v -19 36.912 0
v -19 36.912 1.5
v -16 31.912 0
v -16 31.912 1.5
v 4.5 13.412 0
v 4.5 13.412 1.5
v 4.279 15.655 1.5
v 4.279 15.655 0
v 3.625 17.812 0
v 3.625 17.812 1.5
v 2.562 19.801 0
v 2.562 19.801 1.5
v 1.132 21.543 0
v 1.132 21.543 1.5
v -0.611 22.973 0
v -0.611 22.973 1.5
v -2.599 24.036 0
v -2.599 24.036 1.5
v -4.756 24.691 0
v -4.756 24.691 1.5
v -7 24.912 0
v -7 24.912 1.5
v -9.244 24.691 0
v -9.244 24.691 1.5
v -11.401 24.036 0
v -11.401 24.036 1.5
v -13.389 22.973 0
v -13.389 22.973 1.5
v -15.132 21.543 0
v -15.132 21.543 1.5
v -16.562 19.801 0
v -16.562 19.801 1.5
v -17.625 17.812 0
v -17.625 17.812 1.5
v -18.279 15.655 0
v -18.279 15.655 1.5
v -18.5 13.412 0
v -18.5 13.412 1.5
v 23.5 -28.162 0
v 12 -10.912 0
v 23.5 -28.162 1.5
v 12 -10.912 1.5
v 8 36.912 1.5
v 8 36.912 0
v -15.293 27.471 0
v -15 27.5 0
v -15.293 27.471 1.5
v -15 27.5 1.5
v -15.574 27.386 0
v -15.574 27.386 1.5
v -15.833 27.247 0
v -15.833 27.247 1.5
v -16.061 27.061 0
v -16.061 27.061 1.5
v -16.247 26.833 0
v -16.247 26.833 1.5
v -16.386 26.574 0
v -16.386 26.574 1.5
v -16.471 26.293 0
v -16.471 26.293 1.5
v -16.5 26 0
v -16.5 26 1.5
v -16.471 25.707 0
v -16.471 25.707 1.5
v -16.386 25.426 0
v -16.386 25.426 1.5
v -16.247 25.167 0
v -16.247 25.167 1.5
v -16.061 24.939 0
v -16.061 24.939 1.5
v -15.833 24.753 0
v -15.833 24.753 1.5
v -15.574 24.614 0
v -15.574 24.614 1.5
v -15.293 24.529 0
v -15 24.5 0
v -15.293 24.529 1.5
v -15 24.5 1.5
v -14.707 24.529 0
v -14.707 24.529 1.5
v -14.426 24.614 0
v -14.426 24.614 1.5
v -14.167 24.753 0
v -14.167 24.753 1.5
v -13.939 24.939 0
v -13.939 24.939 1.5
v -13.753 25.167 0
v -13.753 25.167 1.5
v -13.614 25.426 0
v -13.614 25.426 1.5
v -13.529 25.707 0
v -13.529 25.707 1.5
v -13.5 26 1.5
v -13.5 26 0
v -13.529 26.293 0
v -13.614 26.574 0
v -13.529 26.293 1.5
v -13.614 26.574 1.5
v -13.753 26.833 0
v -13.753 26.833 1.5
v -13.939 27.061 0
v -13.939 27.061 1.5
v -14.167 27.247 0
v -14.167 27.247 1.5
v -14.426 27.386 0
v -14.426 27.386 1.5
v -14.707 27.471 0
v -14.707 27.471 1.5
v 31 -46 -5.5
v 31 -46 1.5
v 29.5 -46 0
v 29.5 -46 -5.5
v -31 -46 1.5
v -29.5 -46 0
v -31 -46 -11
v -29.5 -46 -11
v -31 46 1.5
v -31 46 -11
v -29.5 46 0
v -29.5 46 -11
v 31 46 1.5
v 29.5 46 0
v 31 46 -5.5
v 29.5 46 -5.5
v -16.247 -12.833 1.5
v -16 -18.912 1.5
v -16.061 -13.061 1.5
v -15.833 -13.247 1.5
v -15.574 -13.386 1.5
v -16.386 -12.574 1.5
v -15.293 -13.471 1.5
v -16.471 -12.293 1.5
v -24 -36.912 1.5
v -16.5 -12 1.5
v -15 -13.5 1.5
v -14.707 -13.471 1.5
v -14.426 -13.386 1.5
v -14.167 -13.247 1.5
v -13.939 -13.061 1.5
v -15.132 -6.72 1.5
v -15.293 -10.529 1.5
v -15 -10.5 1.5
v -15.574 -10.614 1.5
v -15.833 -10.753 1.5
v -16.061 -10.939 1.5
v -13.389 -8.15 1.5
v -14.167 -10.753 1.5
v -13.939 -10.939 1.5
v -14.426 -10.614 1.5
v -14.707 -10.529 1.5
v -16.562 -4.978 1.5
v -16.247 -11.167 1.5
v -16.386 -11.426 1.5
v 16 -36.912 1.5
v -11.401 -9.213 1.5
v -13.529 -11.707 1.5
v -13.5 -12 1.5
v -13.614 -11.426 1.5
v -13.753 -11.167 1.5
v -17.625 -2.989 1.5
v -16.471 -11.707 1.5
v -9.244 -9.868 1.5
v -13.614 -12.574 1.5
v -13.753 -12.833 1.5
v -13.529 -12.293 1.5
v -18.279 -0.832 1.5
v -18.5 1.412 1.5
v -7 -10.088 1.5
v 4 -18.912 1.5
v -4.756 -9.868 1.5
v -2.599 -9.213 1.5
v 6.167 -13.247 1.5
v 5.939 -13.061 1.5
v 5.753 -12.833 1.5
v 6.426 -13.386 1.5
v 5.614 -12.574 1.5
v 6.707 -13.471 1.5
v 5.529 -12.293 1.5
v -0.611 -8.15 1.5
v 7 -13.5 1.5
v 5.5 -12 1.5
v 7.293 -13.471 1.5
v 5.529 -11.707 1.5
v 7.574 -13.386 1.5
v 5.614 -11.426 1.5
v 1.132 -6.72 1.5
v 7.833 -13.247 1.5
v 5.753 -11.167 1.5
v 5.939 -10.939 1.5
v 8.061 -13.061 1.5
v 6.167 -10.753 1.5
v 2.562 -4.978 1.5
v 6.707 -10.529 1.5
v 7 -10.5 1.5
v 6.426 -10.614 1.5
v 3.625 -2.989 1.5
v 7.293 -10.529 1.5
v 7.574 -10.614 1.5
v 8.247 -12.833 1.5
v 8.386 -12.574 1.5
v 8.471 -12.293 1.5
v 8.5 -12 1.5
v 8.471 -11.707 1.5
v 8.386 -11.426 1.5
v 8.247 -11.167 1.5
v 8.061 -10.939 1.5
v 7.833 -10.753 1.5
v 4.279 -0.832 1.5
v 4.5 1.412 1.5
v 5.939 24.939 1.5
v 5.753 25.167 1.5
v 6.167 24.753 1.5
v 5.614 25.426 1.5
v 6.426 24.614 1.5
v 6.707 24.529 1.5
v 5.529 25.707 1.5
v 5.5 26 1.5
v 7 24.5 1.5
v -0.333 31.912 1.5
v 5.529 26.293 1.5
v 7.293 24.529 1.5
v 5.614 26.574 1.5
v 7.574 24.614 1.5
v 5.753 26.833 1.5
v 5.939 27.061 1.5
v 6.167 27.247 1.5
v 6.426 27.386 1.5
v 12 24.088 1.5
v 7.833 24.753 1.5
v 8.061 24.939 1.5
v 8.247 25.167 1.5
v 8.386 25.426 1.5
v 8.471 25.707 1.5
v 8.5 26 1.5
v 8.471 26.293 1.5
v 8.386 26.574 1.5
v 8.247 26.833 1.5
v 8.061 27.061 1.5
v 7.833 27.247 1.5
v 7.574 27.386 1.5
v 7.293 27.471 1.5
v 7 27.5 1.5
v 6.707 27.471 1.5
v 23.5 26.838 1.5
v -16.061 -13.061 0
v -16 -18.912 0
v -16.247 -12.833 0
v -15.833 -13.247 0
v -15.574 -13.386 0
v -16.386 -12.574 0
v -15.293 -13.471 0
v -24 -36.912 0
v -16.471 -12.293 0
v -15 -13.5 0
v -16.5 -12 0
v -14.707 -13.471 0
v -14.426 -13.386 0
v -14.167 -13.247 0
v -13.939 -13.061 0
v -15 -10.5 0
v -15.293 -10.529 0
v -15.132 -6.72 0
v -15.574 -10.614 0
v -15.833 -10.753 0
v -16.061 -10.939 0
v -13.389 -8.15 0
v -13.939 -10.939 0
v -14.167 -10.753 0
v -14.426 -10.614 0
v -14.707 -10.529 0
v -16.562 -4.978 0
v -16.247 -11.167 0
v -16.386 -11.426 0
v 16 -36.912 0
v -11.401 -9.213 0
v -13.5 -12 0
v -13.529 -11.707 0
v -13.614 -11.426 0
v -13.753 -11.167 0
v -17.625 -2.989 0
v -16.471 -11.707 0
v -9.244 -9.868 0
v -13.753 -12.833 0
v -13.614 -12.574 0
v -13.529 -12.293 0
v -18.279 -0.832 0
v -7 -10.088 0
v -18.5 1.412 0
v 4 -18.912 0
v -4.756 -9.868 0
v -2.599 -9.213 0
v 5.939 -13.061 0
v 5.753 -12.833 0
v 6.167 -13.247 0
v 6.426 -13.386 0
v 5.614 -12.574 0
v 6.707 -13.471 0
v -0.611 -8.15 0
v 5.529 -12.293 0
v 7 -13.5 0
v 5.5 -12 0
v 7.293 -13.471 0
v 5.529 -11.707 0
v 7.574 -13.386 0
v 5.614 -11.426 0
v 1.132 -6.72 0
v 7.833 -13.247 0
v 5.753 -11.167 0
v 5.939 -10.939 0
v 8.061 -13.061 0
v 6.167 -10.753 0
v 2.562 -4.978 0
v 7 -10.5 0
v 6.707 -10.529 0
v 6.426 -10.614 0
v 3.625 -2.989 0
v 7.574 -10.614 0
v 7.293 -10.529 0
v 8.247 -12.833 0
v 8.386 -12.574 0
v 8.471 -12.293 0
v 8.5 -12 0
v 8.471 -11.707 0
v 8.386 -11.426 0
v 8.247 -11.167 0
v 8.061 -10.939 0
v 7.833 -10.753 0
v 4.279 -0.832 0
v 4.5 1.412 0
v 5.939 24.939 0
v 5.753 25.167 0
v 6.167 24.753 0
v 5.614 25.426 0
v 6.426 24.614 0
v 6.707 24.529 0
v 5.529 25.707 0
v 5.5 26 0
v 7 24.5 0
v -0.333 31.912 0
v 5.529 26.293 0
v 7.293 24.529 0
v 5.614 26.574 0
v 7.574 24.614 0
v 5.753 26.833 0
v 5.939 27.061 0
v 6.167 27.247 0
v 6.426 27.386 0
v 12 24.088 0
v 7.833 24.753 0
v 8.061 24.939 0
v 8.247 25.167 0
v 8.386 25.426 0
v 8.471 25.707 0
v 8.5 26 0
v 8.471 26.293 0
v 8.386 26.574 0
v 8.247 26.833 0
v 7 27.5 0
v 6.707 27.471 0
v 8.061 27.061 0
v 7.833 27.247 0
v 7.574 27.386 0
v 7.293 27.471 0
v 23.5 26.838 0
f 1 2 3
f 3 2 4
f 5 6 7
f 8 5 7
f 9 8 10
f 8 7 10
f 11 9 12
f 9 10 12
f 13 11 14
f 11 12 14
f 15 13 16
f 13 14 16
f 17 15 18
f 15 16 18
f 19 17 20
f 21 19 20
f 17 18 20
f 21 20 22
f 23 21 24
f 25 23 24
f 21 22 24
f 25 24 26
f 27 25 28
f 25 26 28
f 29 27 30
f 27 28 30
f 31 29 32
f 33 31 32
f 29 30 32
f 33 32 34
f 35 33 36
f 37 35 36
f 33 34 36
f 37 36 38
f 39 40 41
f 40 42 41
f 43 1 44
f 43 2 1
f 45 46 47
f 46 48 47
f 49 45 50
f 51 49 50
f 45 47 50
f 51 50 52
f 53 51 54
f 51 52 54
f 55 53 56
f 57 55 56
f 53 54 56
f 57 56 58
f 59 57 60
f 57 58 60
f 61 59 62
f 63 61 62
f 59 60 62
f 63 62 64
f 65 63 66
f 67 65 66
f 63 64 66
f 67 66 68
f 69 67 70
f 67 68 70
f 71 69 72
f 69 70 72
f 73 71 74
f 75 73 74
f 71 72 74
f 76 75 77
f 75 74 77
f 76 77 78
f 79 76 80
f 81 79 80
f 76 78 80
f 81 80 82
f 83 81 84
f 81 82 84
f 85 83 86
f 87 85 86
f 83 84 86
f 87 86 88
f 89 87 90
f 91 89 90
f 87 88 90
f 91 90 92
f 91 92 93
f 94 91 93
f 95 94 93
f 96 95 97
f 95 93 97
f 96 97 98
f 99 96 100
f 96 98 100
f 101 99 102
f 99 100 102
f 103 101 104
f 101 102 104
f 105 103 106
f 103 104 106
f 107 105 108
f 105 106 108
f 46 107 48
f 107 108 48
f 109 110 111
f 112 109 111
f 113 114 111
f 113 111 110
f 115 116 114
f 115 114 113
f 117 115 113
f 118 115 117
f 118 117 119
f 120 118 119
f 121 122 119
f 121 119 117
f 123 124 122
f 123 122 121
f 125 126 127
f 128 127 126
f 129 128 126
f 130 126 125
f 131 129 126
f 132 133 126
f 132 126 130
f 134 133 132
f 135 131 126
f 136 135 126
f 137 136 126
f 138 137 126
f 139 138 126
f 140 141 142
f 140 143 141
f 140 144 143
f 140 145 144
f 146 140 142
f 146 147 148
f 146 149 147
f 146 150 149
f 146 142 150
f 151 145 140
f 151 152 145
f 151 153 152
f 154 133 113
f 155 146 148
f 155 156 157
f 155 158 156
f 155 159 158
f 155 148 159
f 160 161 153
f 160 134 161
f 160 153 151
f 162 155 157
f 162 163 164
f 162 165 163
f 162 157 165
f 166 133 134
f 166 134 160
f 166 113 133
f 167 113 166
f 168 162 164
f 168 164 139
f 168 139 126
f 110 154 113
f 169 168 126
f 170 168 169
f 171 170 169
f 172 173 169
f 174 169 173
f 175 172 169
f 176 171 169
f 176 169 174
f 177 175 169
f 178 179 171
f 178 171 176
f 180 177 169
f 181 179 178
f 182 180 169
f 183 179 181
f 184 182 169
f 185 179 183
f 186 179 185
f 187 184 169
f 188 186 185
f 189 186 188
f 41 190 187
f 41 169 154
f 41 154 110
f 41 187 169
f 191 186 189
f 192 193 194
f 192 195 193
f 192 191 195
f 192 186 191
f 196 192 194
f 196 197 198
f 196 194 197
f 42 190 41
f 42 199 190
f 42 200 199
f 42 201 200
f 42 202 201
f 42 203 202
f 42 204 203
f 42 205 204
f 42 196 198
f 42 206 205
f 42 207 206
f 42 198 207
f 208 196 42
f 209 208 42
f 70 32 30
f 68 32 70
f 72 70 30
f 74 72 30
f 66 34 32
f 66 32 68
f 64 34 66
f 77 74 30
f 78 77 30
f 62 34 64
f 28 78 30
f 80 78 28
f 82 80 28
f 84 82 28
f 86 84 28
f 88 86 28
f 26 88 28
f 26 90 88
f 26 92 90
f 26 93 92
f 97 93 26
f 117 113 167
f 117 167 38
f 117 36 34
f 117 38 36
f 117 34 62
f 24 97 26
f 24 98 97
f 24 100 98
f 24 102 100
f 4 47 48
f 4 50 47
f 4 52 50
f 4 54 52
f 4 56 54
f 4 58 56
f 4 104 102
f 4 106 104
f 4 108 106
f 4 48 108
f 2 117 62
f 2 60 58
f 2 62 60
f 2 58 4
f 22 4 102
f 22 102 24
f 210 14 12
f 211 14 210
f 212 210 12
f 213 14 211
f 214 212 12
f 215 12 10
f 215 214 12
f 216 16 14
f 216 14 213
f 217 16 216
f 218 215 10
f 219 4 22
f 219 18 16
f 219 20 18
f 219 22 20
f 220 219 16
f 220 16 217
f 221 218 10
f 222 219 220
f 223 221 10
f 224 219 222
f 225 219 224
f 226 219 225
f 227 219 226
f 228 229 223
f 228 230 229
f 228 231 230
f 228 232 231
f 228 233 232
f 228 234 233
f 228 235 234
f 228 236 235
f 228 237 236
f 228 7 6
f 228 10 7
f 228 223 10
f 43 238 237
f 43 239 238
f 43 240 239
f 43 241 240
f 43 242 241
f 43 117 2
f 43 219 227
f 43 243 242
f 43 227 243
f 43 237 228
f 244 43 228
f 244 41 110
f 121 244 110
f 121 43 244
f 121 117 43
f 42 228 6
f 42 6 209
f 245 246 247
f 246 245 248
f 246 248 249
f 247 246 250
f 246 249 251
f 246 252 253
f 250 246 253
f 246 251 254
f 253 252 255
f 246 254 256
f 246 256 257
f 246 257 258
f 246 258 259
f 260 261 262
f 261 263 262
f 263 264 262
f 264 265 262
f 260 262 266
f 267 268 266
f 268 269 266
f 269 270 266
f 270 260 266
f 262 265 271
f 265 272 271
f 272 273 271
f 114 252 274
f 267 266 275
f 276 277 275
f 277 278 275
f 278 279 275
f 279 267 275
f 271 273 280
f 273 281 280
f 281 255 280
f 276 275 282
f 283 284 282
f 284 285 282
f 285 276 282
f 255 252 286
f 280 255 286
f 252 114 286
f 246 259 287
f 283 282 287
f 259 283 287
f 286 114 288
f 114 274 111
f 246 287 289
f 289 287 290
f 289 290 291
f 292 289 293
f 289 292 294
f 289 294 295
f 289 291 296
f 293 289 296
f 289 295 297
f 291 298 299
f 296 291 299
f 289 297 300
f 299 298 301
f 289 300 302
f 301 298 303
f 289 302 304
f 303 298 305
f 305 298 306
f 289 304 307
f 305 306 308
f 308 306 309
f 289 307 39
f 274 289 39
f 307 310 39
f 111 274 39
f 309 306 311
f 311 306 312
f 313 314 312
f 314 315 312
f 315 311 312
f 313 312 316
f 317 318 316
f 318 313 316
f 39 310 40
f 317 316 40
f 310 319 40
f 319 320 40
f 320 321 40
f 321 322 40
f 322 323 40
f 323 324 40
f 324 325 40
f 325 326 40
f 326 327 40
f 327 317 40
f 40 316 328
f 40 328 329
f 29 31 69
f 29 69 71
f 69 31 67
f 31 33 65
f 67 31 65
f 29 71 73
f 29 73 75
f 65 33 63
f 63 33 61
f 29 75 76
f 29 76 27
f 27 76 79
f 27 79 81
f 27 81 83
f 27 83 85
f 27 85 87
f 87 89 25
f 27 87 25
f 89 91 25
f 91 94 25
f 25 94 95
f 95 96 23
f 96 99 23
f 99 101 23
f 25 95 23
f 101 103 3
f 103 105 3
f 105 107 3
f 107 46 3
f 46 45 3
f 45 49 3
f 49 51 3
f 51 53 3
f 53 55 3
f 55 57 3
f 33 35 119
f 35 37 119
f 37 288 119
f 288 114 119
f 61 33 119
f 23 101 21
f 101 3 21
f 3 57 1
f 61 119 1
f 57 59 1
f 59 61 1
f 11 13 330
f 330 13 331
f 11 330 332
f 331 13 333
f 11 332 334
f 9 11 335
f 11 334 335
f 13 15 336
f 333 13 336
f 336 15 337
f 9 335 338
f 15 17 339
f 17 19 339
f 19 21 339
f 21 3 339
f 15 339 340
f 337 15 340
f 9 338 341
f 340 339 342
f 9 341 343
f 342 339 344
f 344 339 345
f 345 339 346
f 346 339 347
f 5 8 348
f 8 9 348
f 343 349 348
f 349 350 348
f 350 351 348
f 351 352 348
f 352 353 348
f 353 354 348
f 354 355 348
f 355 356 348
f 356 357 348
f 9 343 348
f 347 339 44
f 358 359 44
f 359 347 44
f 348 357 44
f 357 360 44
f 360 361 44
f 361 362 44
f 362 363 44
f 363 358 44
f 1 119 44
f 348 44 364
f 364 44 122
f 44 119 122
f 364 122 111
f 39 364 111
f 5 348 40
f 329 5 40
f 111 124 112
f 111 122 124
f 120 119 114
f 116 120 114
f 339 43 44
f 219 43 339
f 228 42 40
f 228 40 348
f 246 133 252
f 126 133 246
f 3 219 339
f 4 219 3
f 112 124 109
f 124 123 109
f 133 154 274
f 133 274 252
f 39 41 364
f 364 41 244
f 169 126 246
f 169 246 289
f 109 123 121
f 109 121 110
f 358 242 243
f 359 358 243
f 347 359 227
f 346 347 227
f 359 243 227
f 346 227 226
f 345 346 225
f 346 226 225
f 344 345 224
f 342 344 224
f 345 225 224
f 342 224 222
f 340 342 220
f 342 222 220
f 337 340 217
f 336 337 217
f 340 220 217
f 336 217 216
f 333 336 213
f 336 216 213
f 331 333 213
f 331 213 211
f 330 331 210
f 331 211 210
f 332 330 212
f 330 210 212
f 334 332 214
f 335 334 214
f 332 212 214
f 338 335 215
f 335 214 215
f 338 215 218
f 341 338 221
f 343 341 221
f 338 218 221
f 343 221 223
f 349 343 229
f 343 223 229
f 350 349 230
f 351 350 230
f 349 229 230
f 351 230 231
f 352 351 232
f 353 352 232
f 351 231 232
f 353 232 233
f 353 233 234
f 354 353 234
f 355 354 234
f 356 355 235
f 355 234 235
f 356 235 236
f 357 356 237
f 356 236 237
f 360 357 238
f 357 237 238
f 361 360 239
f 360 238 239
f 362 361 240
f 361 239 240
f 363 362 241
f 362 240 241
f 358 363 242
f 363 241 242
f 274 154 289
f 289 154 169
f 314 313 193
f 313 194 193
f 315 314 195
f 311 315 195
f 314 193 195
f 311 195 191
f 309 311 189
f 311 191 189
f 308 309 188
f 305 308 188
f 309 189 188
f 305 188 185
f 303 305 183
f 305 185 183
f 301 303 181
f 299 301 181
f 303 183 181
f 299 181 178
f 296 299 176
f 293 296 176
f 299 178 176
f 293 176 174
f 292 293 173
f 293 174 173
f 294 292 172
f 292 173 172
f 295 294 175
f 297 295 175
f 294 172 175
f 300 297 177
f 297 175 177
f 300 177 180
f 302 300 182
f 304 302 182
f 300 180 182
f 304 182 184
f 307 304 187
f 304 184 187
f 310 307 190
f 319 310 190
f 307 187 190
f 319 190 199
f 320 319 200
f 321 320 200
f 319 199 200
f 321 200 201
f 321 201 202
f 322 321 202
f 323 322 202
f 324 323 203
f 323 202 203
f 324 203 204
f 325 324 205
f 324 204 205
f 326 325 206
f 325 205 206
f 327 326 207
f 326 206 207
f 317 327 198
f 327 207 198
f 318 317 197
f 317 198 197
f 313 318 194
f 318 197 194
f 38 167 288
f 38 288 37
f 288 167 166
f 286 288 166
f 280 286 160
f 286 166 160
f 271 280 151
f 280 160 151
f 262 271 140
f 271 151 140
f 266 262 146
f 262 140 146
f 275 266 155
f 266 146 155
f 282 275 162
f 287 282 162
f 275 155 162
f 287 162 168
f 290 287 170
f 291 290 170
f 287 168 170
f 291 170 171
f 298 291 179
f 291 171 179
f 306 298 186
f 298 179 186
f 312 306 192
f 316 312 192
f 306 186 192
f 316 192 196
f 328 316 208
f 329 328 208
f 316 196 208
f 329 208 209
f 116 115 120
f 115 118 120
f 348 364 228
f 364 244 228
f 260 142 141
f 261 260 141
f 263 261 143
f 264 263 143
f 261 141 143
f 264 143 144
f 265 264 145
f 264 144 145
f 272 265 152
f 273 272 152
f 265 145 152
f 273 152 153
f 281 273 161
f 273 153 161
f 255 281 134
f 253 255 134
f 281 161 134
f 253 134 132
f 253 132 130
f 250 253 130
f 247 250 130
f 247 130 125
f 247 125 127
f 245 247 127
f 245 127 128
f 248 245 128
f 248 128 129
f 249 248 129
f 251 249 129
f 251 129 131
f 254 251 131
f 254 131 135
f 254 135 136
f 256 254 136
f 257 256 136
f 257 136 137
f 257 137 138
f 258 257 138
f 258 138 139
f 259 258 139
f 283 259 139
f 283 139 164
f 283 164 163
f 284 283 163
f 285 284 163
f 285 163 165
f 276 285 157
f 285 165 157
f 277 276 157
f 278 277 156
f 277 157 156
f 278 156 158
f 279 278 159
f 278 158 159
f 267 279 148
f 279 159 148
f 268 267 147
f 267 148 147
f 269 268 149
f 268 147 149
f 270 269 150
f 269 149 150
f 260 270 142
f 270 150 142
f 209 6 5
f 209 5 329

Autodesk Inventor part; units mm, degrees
ref_plane "YZ Plane" through (0, 0, 0) normal (1, 0, 0) x (0, 1, 0)
ref_plane "XZ Plane" through (0, 0, 0) normal (0, 1, 0) x (-1, 0, 0)
ref_plane "XY Plane" through (0, 0, 0) normal (0, 0, 1) x (1, 0, 0)
sketch "スケッチ1" plane through (0, 0, 0) normal (0, 0, 1) x (1, 0, 0)
  line L0 (-31, 46) -> (31, 46)
  line L1 (31, 46) -> (31, -46)
  line L2 (31, -46) -> (-31, -46)
  line L3 (-31, -46) -> (-31, 46)
  point P0 (0, 0)
  dimension "d0" = 92
  dimension "d1" = 46
  dimension "d2" = 62
  dimension "d3" = 31
extrude "押し出し1" add sketch "スケッチ1" along normal blind 1.5
sketch "スケッチ3" plane through (0, 0, 0) normal (0, 0, -1) x (-1, 0, 0)
  circle A0 centre (-7, 26) radius 1.5
  circle A1 centre (15, 26) radius 1.5
  circle A2 centre (-7, -12) radius 1.5
  circle A3 centre (15, -12) radius 1.5
  line L0 (31, 46) -> (-31, 46) projected
  line L1 (31, -46) -> (31, 46) projected
  point P0 (0, 0)
  dimension "d10" = 3
  dimension "d11" = 22
  dimension "d12" = 22
  dimension "d15" = 38
  dimension "d16" = 38
  dimension "d35" = 20
  dimension "d36" = 20
  dimension "d44" = 16
  dimension "d45" = 16
hole "穴1" at (-15, -12, 0) at (-15, 26, 0) at (7, 26, 0) at (7, -12, 0) direction (0, 0, 1) diameter 3 end through all
sketch "スケッチ4" plane through (0, 0, 1.5) normal (0, 0, 1) x (1, 0, 0)
  line L0 (-31, -46) -> (-31, 46) projected
  line L1 (31, -46) -> (-31, -46) projected
  line L2 (-31, 46) -> (-29.5, 46)
  line L3 (-29.5, 46) -> (-29.5, -46)
  line L4 (-29.5, -46) -> (-31, -46)
  line L5 (-31, -46) -> (-31, 46)
  line L6 (31, 46) -> (29.5, 46)
  line L7 (29.5, 46) -> (29.5, -46)
  line L8 (29.5, -46) -> (31, -46)
  line L9 (31, -46) -> (31, 46)
  point P0 (0, 0)
  dimension "d37" = 59
  dimension "d39" = 1.5
extrude "押し出し3" add sketch "スケッチ4" against normal blind 12.5
sketch "スケッチ6" plane through (31, -46, 0) normal (1, 0, 0) x (0, 0, 1)
  line L0 (1.5, 0) -> (-11, 0) projected
  line L1 (-11, -92) -> (-5.5, -92)
  line L2 (-5.5, -92) -> (-5.5, 0)
  line L3 (-5.5, 0) -> (-11, 0)
  line L4 (-11, 0) -> (-11, -92)
  point P0 (0, 0)
  point P1 (0, -46)
extrude "押し出し5" cut sketch "スケッチ6" against normal blind 1.5
sketch "スケッチ7" plane through (0, 0, 1.5) normal (0, 0, 1) x (1, 0, 0)
  line L0 (4.5, 13.4115) -> (4.5, 1.4115)
  line L1 (-18.5, 1.4115) -> (-18.5, 13.4115)
  line L2 (-19, 36.9115) -> (8, 36.9115)
  line L3 (-0.3333, 31.9115) -> (-16, 31.9115)
  line L4 (-16, -18.9115) -> (4, -18.9115)
  line L5 (16, -36.9115) -> (-24, -36.9115)
  line L6 (-24, -36.9115) -> (-16, -18.9115)
  line L7 (16, -36.9115) -> (4, -18.9115)
  line L8 (-19, 36.9115) -> (-16, 31.9115)
  line L9 (8, 36.9115) -> (-0.3333, 31.9115)
  arc A0 (-18.5, 1.4115) -> (4.5, 1.4115) centre (-7, 1.4115) ccw
  arc A1 (4.5, 13.4115) -> (-18.5, 13.4115) centre (-7, 13.4115) ccw
  line L10 (31, -46) -> (31, 46) projected
  line L11 (12, -10.9115) -> (23.5, -28.1615)
  line L12 (23.5, -28.1615) -> (23.5, 26.8385)
  line L13 (23.5, 26.8385) -> (12, 24.0885)
  line L14 (12, -10.9115) -> (12, 24.0885)
  line L15 (29.5, 46) -> (29.5, -46) projected
  line L16 (-29.5, 46) -> (29.5, 46) projected
  point P0 (0, 0)
  dimension "d62" = 12
  dimension "d63" = 11.5
  dimension "d64" = 11.5
  dimension "d65" = 23
  dimension "d70" = 5
  dimension "d72" = 18
  dimension "d73" = 27
  dimension "d89" = 40
  dimension "d92" = 20
  dimension "d114" = 35
  dimension "d115" = 55
  dimension "d118" = 11.5
  dimension "d119" = 6
  dimension "d125" = 38
  dimension "d126" = 9.0885
extrude "押し出し7" cut sketch "スケッチ7" against normal blind 1.5
properties material "アセタール樹脂、白"
